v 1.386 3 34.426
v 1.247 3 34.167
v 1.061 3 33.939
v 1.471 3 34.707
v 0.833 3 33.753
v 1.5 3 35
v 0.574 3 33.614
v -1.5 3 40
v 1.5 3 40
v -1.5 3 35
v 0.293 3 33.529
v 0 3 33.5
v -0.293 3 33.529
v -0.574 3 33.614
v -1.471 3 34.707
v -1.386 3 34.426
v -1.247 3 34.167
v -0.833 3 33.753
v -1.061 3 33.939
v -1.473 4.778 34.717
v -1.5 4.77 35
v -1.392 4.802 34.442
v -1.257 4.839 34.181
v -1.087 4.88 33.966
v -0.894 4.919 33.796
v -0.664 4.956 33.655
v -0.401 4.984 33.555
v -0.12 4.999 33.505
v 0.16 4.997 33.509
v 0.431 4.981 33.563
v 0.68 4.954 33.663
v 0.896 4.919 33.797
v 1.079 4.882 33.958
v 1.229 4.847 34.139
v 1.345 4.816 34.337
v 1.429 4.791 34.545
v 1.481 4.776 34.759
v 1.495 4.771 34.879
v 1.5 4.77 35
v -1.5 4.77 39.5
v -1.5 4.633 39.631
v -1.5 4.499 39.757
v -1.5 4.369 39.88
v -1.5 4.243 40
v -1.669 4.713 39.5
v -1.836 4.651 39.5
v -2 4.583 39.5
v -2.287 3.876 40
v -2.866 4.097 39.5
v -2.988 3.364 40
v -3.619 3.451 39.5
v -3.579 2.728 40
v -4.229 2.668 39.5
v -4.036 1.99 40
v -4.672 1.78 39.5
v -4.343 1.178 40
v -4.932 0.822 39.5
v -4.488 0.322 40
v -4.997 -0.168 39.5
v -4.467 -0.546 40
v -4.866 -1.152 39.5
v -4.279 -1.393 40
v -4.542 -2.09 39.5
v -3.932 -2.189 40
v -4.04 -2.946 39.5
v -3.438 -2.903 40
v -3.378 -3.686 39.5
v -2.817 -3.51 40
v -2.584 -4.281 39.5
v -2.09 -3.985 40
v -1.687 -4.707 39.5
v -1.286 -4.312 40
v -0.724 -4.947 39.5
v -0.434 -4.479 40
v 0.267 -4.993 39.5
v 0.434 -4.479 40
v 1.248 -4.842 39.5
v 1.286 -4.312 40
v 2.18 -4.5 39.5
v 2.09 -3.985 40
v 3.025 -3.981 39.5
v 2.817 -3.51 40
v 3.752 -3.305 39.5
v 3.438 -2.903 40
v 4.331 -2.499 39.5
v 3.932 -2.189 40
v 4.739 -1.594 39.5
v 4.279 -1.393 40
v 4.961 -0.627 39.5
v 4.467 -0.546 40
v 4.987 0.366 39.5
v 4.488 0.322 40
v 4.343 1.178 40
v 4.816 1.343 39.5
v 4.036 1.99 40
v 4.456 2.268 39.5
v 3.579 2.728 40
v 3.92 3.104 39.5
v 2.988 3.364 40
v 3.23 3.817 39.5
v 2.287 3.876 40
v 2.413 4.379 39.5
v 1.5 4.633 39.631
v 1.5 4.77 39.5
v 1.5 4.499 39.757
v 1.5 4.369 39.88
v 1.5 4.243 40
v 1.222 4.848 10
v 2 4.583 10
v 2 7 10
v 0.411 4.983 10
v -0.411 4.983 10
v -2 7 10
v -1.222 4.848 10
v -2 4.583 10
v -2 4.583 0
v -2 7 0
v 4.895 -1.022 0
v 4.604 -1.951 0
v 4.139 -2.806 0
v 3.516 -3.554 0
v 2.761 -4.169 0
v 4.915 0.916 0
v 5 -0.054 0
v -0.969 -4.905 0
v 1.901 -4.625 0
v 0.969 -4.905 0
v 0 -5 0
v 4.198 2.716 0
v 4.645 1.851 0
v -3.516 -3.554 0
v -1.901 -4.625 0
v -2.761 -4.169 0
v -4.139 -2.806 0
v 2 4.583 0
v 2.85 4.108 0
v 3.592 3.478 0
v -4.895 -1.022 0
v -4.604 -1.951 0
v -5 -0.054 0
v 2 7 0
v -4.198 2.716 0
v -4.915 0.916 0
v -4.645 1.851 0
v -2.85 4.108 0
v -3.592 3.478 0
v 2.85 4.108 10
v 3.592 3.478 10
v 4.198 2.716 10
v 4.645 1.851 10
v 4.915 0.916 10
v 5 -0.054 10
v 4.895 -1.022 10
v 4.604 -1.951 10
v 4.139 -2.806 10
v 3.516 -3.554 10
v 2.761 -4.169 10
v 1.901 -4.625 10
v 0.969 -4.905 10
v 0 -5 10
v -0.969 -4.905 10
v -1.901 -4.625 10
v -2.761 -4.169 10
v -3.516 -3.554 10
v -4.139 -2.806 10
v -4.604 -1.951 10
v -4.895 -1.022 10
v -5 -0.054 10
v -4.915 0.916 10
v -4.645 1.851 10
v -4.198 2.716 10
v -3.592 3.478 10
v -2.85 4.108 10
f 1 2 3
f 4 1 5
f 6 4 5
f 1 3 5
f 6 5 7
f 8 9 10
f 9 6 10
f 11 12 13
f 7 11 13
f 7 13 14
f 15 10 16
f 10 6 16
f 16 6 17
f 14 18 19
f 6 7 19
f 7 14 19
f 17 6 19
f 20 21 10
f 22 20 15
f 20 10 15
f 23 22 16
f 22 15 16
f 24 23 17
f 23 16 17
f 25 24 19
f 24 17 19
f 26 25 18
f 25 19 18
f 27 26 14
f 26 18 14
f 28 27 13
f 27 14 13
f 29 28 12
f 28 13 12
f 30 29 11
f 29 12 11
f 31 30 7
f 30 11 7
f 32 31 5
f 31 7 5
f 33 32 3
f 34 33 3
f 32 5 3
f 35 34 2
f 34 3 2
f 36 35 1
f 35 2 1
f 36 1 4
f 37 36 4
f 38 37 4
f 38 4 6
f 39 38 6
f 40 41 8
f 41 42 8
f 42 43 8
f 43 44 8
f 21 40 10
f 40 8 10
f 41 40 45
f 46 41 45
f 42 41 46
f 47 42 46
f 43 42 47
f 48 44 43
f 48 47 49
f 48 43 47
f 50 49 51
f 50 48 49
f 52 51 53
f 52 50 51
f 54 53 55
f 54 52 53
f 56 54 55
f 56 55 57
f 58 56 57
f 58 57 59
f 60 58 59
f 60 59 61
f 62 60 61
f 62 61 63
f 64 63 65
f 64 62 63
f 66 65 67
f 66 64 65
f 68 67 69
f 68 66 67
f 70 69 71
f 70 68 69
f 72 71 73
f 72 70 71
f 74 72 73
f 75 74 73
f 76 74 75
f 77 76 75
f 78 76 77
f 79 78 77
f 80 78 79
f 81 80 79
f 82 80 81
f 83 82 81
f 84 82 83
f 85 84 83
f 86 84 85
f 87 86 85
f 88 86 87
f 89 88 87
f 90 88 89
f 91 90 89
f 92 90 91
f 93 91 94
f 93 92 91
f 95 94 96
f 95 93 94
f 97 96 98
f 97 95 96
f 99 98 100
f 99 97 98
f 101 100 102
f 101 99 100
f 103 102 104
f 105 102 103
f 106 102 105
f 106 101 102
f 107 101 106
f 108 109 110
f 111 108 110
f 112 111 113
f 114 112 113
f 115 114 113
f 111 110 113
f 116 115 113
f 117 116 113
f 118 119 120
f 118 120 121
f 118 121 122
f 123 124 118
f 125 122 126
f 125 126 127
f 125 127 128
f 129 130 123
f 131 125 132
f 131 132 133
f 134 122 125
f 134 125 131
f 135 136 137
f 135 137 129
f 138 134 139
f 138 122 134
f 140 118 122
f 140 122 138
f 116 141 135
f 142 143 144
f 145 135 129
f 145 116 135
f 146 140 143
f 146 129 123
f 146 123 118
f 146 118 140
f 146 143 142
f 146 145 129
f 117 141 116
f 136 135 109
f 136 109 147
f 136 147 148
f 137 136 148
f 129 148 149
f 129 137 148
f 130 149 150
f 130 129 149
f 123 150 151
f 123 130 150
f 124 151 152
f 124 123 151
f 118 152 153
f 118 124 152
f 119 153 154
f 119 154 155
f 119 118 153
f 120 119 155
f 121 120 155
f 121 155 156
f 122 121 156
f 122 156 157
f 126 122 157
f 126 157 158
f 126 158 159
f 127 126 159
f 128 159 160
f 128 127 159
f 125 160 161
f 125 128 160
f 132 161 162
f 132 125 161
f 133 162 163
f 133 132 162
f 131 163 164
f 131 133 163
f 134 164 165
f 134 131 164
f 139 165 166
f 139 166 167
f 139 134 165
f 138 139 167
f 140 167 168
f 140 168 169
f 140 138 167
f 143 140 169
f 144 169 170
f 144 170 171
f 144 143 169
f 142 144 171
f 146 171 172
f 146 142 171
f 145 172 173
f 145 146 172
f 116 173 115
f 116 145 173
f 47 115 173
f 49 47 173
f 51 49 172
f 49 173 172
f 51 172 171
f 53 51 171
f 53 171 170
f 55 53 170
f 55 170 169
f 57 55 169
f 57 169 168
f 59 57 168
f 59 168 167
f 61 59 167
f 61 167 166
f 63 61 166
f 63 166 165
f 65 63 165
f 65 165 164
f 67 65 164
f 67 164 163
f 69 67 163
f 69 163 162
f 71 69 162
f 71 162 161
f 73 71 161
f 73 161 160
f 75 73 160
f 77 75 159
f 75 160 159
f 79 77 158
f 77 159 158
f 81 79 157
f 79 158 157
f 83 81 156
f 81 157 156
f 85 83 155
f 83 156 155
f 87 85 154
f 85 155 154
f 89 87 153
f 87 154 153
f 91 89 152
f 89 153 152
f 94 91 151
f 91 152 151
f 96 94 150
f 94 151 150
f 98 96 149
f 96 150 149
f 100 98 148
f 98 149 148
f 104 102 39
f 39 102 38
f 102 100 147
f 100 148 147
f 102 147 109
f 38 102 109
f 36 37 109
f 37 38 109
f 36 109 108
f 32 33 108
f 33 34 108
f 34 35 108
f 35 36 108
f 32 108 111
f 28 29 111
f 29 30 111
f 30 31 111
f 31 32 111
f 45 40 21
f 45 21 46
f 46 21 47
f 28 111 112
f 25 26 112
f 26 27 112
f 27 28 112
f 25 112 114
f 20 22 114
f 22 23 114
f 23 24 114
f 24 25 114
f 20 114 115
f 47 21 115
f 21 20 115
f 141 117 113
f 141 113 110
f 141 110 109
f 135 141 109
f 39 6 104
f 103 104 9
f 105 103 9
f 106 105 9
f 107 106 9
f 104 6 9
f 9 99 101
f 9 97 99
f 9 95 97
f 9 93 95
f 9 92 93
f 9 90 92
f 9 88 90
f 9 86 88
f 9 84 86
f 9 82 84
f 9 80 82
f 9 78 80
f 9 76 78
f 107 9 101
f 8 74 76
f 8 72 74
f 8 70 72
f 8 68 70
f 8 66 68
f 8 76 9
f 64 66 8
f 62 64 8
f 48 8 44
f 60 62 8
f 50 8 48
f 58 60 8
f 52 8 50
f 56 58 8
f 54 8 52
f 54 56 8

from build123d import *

# Parameters (mm, degrees)
BOSS_EXTRUDE1_DEPTH = 10
SKETCH2_R           = 5
BOSS_EXTRUDE2_DEPTH = 30
CUT_EXTRUDE1_START  = 3
CUT_EXTRUDE1_DEPTH  = 38.914545091
CHAMFER1_SIZE       = 0.5


with BuildPart() as part:
    # Sketch1 → Boss-Extrude1 (new body)
    with BuildSketch(Plane.XY):
        with BuildLine():
            Line((-2, 7), (2, 7))
            Line((2, 7), (2, 4.582575695))
            ThreePointArc((2, 4.582575695), (0, -5), (-2, 4.582575695))
            Line((-2, 4.582575695), (-2, 7))
        make_face()
    extrude(amount=BOSS_EXTRUDE1_DEPTH)

    # Sketch2 → Boss-Extrude2 (add)
    with BuildSketch(Plane.XY.offset(10)):
        with Locations(Location((0, 0, 0), (0, 0, 113.578178478))):
            Circle(SKETCH2_R)
    extrude(amount=BOSS_EXTRUDE2_DEPTH)

    # Sketch3 → Cut-Extrude1 (cut, through all)
    with BuildSketch(Plane(origin=(0, 0, 0), x_dir=(1, 0, 0), z_dir=(0, 1, 0)).offset(CUT_EXTRUDE1_START)):
        with BuildLine():
            Line((-1.5, -40), (-1.5, -35))
            ThreePointArc((-1.5, -35), (0, -33.5), (1.5, -35))
            Line((1.5, -35), (1.5, -40))
            ThreePointArc((1.5, -40), (0, -41.5), (-1.5, -40))
        make_face()
    extrude(amount=CUT_EXTRUDE1_DEPTH, mode=Mode.SUBTRACT)

    # Chamfer1
    chamfer1_edges = [part.edges().sort_by_distance(p)[0] for p in [
        (0.266933518, -4.992869565, 40),
    ]]
    chamfer(chamfer1_edges, length=CHAMFER1_SIZE)


solid = part.part
